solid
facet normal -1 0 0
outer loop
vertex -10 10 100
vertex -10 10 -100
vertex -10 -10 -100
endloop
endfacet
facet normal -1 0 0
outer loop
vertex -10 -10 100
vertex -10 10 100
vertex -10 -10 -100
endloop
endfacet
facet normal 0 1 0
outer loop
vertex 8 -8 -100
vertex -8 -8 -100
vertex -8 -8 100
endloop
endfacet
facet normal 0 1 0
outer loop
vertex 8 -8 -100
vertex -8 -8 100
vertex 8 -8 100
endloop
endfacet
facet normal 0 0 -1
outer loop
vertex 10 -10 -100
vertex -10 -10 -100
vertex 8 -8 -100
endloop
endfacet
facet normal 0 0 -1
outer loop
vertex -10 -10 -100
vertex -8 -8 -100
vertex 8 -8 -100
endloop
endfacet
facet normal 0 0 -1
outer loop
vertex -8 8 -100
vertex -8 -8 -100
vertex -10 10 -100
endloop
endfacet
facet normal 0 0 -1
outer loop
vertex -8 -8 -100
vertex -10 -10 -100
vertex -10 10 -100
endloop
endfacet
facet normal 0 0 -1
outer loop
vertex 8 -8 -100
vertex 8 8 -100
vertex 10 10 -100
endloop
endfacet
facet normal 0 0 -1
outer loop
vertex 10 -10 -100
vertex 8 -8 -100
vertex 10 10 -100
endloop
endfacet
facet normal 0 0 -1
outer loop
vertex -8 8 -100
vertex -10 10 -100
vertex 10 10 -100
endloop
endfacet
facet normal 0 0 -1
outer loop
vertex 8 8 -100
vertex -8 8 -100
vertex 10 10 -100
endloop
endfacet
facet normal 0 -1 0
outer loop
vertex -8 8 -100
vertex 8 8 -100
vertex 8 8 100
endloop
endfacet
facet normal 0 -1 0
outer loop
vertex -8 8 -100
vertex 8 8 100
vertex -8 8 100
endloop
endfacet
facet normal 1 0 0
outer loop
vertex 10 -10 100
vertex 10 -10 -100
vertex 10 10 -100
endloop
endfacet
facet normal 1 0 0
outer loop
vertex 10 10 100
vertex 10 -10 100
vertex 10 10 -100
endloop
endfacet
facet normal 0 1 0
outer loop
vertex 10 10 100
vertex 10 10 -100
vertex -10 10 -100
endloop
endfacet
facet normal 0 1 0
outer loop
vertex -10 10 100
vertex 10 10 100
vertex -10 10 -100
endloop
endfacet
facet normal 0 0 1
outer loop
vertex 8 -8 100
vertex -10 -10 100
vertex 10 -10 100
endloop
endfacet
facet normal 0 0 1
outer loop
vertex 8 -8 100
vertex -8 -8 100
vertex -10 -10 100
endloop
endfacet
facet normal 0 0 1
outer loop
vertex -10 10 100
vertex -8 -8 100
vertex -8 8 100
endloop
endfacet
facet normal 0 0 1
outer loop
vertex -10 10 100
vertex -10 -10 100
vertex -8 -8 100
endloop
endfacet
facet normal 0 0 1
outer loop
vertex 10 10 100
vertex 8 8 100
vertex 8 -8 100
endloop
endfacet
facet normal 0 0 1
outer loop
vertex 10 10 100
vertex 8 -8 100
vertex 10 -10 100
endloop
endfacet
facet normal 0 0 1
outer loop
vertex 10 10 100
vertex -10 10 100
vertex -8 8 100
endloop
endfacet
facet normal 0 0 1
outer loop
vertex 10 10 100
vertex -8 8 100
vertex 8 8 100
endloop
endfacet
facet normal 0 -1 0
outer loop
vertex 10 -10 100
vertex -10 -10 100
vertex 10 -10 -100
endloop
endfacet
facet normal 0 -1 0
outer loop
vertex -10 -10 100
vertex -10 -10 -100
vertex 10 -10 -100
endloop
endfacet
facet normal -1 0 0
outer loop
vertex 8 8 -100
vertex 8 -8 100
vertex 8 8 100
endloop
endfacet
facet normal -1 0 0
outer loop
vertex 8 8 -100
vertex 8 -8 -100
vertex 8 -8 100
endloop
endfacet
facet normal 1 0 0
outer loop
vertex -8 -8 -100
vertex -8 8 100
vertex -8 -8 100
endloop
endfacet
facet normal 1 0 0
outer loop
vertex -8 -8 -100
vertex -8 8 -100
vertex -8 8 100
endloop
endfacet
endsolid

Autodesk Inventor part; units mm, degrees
sketch "Esboço1" plane through (0, 0, 0) normal (0, 0, 1) x (1, 0, 0)
  line L0 (-10, -10) -> (10, -10)
  line L1 (10, -10) -> (10, 10)
  line L2 (10, 10) -> (-10, 10)
  line L3 (-10, 10) -> (-10, -10)
  line L4 (-10, -10) -> (10, 10) construction
  line L5 (10, -10) -> (-10, 10) construction
  line L6 (-8, -8) -> (8, -8)
  line L7 (8, -8) -> (8, 8)
  line L8 (8, 8) -> (-8, 8)
  line L9 (-8, 8) -> (-8, -8)
  line L10 (-8, -8) -> (8, 8) construction
  line L11 (8, -8) -> (-8, 8) construction
  point P0 (0, 0)
  dimension "d0" = 20
  dimension "d1" = 2
extrude "Extrusão1" add sketch "Esboço1" along normal mid plane 200
properties part number "Sessao8_07_04_2025_0002_0001" material "Titânio"
